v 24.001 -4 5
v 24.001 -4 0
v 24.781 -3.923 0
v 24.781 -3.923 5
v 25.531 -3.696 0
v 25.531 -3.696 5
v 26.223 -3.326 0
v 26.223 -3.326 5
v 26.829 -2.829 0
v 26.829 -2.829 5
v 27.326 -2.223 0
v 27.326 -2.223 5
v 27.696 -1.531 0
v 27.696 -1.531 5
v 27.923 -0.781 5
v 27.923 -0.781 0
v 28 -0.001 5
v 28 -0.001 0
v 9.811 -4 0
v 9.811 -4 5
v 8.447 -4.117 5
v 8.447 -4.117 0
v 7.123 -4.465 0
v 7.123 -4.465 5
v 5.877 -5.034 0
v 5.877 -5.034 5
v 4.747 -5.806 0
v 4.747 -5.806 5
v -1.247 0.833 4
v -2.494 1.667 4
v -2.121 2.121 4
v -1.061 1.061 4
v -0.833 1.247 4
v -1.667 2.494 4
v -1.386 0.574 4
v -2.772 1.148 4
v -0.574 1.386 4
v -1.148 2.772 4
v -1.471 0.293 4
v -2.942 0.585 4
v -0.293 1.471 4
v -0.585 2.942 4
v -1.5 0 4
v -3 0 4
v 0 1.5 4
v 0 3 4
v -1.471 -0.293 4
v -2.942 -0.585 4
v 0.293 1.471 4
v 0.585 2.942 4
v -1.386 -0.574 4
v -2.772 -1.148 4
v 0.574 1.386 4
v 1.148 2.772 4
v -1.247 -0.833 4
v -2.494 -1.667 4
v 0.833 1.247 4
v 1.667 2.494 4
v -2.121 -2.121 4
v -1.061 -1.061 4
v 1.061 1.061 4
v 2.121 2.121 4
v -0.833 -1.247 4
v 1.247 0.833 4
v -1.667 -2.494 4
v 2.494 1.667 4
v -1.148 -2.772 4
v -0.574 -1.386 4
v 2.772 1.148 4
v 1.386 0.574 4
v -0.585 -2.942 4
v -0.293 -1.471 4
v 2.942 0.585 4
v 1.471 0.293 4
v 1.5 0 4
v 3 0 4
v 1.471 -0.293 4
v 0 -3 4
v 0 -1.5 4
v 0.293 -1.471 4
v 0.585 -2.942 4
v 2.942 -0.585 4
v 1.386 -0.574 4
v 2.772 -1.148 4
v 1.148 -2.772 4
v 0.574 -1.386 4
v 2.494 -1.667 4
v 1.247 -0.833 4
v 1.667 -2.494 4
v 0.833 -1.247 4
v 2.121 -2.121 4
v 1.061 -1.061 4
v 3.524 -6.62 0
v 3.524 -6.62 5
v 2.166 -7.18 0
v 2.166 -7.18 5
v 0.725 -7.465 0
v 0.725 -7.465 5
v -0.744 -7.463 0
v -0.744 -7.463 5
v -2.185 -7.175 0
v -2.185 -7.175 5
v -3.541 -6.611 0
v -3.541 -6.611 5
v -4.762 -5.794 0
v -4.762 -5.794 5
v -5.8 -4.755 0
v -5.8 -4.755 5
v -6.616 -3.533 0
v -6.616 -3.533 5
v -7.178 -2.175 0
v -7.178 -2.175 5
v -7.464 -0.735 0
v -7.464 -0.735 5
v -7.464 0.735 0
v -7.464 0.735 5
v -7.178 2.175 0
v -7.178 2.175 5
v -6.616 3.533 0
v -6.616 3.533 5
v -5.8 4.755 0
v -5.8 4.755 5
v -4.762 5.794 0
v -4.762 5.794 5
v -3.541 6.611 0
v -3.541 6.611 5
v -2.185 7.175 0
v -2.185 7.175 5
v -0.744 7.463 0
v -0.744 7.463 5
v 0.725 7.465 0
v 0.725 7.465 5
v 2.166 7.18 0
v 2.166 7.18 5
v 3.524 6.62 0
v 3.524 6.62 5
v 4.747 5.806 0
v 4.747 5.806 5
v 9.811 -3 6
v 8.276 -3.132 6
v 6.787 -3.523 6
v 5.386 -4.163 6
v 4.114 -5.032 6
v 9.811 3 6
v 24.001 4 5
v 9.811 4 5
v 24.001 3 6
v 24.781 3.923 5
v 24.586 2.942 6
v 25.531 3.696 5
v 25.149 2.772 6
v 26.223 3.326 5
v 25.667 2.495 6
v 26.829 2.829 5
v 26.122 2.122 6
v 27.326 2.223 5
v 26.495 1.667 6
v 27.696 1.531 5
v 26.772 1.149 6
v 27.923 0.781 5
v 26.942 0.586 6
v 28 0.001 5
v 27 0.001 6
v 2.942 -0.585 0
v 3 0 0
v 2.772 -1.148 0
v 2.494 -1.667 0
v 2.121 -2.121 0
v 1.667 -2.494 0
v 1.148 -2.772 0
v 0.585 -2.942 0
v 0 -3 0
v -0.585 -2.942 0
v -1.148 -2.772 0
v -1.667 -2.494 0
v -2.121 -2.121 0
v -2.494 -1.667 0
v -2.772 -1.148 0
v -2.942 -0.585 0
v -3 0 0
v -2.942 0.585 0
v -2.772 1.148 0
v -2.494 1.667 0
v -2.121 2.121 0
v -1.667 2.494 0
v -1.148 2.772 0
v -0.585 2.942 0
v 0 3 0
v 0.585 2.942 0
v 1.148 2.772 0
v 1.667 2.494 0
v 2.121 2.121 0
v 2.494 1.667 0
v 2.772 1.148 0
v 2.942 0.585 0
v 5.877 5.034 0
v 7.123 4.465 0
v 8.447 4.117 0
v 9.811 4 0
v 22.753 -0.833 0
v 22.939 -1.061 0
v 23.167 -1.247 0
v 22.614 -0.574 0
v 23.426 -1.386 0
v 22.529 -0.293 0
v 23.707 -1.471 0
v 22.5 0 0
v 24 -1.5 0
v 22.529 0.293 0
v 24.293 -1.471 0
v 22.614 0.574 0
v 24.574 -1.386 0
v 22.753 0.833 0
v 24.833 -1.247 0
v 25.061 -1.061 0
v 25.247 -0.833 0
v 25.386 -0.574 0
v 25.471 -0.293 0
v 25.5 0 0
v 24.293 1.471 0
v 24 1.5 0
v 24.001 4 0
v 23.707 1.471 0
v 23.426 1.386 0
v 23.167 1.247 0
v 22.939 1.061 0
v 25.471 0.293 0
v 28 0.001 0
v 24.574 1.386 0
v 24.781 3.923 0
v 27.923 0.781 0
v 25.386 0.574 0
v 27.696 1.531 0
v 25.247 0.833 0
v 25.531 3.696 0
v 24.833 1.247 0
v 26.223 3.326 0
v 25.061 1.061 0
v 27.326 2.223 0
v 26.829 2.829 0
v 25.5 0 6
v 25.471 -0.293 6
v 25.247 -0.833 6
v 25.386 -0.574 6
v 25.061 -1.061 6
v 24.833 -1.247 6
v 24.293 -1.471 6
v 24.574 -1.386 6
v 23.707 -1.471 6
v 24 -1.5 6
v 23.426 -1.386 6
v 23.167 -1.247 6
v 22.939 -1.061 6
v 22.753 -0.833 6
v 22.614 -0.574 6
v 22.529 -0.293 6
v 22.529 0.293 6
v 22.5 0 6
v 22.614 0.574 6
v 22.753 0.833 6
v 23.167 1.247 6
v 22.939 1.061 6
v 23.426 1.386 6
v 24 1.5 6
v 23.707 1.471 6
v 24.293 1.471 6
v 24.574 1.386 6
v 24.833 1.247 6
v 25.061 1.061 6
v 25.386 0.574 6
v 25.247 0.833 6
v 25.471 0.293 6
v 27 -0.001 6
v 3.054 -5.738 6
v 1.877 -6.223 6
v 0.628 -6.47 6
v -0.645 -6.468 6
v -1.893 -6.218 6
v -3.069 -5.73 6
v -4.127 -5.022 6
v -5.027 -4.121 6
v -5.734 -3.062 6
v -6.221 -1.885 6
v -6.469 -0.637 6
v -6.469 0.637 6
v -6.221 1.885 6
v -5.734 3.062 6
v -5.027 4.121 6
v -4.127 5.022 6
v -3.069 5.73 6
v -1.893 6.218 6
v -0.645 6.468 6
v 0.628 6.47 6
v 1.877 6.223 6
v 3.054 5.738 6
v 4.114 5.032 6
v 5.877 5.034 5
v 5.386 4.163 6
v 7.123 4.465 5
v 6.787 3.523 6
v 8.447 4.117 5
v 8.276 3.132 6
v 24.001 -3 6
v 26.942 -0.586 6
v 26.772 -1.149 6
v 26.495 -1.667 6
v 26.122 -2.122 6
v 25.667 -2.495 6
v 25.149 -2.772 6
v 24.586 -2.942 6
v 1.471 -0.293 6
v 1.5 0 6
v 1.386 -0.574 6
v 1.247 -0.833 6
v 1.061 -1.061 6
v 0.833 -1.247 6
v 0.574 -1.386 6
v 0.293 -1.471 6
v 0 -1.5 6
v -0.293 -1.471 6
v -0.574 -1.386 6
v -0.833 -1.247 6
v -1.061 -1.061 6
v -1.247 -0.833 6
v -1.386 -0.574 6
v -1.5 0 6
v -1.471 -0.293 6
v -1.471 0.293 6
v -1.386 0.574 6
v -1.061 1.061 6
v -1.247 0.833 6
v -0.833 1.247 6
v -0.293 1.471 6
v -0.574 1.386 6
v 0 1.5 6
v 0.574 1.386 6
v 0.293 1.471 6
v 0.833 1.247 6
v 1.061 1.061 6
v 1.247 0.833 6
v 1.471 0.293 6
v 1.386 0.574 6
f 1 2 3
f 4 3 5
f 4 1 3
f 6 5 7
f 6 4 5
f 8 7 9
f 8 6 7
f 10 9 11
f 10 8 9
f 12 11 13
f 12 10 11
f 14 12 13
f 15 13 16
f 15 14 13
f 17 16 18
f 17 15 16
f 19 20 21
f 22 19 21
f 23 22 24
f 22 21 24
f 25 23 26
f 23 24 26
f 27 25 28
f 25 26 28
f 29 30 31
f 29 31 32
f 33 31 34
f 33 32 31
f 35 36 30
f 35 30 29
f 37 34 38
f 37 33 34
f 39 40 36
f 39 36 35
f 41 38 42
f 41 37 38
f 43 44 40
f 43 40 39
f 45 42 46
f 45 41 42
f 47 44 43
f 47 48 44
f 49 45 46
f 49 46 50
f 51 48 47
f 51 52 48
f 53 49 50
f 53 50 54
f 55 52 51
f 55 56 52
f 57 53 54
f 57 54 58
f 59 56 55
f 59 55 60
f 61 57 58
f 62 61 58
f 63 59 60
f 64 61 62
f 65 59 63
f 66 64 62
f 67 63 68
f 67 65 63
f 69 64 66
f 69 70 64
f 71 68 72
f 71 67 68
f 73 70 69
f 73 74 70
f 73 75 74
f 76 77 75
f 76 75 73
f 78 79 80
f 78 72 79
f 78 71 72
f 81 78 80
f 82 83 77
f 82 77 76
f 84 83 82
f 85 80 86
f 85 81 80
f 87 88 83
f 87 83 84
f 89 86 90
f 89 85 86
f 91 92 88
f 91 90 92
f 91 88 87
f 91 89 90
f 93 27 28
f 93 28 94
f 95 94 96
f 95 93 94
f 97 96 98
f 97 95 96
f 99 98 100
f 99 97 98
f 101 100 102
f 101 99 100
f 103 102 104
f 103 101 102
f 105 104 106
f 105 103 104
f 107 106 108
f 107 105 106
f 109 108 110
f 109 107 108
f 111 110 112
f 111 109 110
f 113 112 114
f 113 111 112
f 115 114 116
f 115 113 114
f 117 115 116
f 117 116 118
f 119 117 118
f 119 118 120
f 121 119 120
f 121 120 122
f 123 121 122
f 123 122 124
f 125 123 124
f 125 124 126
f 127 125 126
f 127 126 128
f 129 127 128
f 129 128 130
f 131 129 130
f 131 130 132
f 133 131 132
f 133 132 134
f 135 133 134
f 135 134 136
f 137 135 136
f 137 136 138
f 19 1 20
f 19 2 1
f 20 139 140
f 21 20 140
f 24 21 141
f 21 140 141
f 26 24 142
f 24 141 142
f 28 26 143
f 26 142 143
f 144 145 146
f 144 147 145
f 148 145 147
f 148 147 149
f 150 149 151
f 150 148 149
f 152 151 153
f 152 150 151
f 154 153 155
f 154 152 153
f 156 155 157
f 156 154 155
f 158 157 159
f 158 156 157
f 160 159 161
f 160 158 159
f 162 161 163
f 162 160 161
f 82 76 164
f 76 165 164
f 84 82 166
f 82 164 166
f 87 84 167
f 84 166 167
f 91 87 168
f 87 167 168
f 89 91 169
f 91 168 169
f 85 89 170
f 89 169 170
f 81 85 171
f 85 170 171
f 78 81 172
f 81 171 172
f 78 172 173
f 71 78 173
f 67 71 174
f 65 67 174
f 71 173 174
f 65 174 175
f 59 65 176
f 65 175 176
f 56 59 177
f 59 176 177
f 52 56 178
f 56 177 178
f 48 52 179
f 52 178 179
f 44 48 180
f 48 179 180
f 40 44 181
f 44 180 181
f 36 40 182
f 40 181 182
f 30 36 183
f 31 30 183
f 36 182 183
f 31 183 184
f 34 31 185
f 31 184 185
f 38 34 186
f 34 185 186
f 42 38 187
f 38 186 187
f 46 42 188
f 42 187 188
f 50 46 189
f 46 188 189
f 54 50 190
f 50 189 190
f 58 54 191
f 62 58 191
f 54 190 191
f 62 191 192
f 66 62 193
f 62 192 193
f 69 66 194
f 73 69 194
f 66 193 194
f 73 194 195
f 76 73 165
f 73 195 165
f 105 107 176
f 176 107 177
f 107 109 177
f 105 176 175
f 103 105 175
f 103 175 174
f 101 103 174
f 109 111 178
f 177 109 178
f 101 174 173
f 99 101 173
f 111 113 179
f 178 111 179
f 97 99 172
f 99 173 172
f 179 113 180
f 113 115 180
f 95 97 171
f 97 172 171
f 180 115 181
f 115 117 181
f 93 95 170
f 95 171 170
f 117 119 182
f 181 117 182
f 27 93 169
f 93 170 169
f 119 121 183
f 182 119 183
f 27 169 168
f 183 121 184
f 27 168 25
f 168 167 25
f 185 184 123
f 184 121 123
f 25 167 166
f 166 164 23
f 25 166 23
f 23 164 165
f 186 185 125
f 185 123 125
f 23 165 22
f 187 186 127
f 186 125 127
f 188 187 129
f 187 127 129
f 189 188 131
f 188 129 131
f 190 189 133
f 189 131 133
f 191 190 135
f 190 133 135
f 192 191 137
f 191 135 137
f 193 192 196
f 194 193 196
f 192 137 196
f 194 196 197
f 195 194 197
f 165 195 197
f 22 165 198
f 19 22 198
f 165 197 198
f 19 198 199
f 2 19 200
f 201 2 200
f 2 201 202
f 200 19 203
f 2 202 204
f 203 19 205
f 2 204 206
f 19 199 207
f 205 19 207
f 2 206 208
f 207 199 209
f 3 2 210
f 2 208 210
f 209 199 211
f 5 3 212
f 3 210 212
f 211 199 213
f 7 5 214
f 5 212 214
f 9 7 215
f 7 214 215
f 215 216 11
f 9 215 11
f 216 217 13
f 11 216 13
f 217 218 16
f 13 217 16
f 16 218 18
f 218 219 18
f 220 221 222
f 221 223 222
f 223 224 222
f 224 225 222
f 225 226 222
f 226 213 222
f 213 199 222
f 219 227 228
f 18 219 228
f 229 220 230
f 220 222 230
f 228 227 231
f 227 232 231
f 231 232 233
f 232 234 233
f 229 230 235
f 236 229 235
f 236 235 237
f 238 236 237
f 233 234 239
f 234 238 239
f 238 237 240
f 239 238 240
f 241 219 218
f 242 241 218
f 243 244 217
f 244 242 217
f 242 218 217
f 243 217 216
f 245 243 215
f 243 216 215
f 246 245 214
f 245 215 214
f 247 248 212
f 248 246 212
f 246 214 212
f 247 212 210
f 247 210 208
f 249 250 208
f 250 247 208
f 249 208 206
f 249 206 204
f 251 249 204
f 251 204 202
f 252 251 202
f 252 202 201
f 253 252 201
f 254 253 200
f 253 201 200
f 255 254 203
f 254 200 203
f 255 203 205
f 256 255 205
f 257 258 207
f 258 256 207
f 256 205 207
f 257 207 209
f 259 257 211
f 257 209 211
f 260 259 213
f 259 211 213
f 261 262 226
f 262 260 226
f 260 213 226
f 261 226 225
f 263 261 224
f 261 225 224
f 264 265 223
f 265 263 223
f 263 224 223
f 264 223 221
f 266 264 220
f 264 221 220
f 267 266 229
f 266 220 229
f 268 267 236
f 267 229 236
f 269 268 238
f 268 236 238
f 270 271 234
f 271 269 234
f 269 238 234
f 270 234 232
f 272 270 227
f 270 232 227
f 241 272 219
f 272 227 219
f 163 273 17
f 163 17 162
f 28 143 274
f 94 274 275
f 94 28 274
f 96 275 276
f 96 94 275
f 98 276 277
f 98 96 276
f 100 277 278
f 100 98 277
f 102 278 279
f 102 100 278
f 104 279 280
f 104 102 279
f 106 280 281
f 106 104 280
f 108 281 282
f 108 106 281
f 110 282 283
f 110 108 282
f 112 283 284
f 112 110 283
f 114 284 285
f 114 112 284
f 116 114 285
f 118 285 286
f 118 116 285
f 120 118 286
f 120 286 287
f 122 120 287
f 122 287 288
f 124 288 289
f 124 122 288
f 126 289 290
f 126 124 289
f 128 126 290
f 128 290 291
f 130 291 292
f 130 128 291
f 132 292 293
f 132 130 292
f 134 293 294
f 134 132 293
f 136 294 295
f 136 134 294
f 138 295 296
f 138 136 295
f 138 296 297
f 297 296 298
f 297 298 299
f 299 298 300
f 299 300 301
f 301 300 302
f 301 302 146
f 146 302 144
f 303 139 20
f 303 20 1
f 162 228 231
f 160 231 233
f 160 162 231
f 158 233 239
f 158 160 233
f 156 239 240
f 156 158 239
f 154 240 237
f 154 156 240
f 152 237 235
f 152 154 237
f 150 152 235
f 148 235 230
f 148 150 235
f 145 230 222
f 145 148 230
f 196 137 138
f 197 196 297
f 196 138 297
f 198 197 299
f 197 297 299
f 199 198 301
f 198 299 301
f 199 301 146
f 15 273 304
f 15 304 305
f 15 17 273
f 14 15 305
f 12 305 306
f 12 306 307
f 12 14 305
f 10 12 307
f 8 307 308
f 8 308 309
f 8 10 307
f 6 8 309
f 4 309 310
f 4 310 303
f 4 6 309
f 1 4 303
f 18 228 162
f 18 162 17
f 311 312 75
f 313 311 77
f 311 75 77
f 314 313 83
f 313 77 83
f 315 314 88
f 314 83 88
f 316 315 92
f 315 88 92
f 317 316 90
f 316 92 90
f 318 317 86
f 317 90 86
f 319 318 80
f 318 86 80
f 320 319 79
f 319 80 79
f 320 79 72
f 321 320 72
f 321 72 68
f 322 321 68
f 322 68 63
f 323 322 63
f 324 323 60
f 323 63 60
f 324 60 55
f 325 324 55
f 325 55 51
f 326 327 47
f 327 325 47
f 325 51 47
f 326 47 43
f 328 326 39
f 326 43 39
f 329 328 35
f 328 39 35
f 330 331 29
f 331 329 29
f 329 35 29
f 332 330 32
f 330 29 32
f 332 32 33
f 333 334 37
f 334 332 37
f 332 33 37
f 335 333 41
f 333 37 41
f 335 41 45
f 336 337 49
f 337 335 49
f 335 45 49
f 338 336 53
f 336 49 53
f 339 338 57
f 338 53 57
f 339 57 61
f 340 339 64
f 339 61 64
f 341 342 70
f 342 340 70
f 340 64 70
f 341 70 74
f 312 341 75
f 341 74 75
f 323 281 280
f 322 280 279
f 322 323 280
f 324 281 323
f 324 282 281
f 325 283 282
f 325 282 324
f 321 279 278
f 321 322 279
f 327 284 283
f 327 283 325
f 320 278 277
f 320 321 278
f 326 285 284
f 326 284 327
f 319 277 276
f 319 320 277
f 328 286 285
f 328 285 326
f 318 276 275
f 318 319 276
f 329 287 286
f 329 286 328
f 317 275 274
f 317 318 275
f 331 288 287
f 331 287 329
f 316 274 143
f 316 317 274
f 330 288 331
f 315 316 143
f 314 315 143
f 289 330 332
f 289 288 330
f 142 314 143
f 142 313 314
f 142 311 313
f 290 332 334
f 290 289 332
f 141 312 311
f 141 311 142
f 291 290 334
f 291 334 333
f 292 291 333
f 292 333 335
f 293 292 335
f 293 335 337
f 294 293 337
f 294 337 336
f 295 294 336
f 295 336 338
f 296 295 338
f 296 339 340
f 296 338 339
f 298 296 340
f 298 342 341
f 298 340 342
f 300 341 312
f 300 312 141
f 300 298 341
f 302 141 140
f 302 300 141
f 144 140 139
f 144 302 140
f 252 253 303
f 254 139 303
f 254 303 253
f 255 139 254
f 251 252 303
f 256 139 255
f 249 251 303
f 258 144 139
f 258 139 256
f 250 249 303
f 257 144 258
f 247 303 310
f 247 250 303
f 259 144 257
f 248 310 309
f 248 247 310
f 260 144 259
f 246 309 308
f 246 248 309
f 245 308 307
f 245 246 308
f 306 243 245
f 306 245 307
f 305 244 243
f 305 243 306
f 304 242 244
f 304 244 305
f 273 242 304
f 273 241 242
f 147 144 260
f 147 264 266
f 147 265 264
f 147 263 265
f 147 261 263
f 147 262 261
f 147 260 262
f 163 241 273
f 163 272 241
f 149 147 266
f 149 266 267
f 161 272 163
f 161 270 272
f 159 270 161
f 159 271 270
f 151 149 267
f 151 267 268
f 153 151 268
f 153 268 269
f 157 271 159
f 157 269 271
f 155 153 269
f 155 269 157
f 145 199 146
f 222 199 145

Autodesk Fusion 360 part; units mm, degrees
sketch "Sketch1" plane through (0, 0, 0) normal (0, 0, 1) x (1, 0, 0)
  circle A0 centre (0, 0) radius 7.5
  line L0 (0, 4) -> (28, 4)
  line L1 (28, 4) -> (28, -4)
  line L2 (28, -4) -> (0, -4)
  line L3 (0, -4) -> (0, 4)
  circle A1 centre (0, 0) radius 1.5
  circle A2 centre (24, 0) radius 1.5
  dimension "d1" = 15
  dimension "d2" = 28
  dimension "d3" = 8
  dimension "d4" = 4
  dimension "d5" = 3
  dimension "d6" = 3
  dimension "d7" = 24
extrude "Extrude1" add sketch "Sketch1" along normal blind 6 contours A0 L0 L2 L3 A1 | A0 L0 L1 L2 | A0 L0 L2 L3 A1
fillet "Fillet1" radius 8 2 edges at (6.3443, -4, 3) (6.3443, 4, 3)
fillet "Fillet2" radius 4 2 edges at (28, 4, 3) (28, -4, 3)
chamfer "Chamfer1" distance 1 angle 45 6 edges at (16.9054, -4, 6) (28, 0, 6) (16.9054, 4, 6) (7.1226, 4.4651, 6) (-7.5, 0, 6) (7.1226, -4.4651, 6)
sketch "Sketch2" plane through (0, 0, 0) normal (0, 0, -1) x (1, 0, 0)
  arc A0 (24, -4) -> (24, 4) centre (24, 0) ccw
  line L0 (24, 4) -> (9.8107, 4)
  arc A1 (4.7471, 5.8065) -> (9.8107, 4) centre (9.8107, 12) ccw
  arc A2 (4.7471, 5.8065) -> (4.7471, -5.8065) centre (0, 0) ccw
  arc A3 (9.8107, -4) -> (4.7471, -5.8065) centre (9.8107, -12) ccw
  line L1 (9.8107, -4) -> (24, -4)
  circle A4 centre (24, 0) radius 1.5
  circle A5 centre (0, 0) radius 1.5
  circle A6 centre (0, 0) radius 3
  dimension "d15" = 6
extrude "Extrude2" cut sketch "Sketch2" against normal blind 4 contours A6
